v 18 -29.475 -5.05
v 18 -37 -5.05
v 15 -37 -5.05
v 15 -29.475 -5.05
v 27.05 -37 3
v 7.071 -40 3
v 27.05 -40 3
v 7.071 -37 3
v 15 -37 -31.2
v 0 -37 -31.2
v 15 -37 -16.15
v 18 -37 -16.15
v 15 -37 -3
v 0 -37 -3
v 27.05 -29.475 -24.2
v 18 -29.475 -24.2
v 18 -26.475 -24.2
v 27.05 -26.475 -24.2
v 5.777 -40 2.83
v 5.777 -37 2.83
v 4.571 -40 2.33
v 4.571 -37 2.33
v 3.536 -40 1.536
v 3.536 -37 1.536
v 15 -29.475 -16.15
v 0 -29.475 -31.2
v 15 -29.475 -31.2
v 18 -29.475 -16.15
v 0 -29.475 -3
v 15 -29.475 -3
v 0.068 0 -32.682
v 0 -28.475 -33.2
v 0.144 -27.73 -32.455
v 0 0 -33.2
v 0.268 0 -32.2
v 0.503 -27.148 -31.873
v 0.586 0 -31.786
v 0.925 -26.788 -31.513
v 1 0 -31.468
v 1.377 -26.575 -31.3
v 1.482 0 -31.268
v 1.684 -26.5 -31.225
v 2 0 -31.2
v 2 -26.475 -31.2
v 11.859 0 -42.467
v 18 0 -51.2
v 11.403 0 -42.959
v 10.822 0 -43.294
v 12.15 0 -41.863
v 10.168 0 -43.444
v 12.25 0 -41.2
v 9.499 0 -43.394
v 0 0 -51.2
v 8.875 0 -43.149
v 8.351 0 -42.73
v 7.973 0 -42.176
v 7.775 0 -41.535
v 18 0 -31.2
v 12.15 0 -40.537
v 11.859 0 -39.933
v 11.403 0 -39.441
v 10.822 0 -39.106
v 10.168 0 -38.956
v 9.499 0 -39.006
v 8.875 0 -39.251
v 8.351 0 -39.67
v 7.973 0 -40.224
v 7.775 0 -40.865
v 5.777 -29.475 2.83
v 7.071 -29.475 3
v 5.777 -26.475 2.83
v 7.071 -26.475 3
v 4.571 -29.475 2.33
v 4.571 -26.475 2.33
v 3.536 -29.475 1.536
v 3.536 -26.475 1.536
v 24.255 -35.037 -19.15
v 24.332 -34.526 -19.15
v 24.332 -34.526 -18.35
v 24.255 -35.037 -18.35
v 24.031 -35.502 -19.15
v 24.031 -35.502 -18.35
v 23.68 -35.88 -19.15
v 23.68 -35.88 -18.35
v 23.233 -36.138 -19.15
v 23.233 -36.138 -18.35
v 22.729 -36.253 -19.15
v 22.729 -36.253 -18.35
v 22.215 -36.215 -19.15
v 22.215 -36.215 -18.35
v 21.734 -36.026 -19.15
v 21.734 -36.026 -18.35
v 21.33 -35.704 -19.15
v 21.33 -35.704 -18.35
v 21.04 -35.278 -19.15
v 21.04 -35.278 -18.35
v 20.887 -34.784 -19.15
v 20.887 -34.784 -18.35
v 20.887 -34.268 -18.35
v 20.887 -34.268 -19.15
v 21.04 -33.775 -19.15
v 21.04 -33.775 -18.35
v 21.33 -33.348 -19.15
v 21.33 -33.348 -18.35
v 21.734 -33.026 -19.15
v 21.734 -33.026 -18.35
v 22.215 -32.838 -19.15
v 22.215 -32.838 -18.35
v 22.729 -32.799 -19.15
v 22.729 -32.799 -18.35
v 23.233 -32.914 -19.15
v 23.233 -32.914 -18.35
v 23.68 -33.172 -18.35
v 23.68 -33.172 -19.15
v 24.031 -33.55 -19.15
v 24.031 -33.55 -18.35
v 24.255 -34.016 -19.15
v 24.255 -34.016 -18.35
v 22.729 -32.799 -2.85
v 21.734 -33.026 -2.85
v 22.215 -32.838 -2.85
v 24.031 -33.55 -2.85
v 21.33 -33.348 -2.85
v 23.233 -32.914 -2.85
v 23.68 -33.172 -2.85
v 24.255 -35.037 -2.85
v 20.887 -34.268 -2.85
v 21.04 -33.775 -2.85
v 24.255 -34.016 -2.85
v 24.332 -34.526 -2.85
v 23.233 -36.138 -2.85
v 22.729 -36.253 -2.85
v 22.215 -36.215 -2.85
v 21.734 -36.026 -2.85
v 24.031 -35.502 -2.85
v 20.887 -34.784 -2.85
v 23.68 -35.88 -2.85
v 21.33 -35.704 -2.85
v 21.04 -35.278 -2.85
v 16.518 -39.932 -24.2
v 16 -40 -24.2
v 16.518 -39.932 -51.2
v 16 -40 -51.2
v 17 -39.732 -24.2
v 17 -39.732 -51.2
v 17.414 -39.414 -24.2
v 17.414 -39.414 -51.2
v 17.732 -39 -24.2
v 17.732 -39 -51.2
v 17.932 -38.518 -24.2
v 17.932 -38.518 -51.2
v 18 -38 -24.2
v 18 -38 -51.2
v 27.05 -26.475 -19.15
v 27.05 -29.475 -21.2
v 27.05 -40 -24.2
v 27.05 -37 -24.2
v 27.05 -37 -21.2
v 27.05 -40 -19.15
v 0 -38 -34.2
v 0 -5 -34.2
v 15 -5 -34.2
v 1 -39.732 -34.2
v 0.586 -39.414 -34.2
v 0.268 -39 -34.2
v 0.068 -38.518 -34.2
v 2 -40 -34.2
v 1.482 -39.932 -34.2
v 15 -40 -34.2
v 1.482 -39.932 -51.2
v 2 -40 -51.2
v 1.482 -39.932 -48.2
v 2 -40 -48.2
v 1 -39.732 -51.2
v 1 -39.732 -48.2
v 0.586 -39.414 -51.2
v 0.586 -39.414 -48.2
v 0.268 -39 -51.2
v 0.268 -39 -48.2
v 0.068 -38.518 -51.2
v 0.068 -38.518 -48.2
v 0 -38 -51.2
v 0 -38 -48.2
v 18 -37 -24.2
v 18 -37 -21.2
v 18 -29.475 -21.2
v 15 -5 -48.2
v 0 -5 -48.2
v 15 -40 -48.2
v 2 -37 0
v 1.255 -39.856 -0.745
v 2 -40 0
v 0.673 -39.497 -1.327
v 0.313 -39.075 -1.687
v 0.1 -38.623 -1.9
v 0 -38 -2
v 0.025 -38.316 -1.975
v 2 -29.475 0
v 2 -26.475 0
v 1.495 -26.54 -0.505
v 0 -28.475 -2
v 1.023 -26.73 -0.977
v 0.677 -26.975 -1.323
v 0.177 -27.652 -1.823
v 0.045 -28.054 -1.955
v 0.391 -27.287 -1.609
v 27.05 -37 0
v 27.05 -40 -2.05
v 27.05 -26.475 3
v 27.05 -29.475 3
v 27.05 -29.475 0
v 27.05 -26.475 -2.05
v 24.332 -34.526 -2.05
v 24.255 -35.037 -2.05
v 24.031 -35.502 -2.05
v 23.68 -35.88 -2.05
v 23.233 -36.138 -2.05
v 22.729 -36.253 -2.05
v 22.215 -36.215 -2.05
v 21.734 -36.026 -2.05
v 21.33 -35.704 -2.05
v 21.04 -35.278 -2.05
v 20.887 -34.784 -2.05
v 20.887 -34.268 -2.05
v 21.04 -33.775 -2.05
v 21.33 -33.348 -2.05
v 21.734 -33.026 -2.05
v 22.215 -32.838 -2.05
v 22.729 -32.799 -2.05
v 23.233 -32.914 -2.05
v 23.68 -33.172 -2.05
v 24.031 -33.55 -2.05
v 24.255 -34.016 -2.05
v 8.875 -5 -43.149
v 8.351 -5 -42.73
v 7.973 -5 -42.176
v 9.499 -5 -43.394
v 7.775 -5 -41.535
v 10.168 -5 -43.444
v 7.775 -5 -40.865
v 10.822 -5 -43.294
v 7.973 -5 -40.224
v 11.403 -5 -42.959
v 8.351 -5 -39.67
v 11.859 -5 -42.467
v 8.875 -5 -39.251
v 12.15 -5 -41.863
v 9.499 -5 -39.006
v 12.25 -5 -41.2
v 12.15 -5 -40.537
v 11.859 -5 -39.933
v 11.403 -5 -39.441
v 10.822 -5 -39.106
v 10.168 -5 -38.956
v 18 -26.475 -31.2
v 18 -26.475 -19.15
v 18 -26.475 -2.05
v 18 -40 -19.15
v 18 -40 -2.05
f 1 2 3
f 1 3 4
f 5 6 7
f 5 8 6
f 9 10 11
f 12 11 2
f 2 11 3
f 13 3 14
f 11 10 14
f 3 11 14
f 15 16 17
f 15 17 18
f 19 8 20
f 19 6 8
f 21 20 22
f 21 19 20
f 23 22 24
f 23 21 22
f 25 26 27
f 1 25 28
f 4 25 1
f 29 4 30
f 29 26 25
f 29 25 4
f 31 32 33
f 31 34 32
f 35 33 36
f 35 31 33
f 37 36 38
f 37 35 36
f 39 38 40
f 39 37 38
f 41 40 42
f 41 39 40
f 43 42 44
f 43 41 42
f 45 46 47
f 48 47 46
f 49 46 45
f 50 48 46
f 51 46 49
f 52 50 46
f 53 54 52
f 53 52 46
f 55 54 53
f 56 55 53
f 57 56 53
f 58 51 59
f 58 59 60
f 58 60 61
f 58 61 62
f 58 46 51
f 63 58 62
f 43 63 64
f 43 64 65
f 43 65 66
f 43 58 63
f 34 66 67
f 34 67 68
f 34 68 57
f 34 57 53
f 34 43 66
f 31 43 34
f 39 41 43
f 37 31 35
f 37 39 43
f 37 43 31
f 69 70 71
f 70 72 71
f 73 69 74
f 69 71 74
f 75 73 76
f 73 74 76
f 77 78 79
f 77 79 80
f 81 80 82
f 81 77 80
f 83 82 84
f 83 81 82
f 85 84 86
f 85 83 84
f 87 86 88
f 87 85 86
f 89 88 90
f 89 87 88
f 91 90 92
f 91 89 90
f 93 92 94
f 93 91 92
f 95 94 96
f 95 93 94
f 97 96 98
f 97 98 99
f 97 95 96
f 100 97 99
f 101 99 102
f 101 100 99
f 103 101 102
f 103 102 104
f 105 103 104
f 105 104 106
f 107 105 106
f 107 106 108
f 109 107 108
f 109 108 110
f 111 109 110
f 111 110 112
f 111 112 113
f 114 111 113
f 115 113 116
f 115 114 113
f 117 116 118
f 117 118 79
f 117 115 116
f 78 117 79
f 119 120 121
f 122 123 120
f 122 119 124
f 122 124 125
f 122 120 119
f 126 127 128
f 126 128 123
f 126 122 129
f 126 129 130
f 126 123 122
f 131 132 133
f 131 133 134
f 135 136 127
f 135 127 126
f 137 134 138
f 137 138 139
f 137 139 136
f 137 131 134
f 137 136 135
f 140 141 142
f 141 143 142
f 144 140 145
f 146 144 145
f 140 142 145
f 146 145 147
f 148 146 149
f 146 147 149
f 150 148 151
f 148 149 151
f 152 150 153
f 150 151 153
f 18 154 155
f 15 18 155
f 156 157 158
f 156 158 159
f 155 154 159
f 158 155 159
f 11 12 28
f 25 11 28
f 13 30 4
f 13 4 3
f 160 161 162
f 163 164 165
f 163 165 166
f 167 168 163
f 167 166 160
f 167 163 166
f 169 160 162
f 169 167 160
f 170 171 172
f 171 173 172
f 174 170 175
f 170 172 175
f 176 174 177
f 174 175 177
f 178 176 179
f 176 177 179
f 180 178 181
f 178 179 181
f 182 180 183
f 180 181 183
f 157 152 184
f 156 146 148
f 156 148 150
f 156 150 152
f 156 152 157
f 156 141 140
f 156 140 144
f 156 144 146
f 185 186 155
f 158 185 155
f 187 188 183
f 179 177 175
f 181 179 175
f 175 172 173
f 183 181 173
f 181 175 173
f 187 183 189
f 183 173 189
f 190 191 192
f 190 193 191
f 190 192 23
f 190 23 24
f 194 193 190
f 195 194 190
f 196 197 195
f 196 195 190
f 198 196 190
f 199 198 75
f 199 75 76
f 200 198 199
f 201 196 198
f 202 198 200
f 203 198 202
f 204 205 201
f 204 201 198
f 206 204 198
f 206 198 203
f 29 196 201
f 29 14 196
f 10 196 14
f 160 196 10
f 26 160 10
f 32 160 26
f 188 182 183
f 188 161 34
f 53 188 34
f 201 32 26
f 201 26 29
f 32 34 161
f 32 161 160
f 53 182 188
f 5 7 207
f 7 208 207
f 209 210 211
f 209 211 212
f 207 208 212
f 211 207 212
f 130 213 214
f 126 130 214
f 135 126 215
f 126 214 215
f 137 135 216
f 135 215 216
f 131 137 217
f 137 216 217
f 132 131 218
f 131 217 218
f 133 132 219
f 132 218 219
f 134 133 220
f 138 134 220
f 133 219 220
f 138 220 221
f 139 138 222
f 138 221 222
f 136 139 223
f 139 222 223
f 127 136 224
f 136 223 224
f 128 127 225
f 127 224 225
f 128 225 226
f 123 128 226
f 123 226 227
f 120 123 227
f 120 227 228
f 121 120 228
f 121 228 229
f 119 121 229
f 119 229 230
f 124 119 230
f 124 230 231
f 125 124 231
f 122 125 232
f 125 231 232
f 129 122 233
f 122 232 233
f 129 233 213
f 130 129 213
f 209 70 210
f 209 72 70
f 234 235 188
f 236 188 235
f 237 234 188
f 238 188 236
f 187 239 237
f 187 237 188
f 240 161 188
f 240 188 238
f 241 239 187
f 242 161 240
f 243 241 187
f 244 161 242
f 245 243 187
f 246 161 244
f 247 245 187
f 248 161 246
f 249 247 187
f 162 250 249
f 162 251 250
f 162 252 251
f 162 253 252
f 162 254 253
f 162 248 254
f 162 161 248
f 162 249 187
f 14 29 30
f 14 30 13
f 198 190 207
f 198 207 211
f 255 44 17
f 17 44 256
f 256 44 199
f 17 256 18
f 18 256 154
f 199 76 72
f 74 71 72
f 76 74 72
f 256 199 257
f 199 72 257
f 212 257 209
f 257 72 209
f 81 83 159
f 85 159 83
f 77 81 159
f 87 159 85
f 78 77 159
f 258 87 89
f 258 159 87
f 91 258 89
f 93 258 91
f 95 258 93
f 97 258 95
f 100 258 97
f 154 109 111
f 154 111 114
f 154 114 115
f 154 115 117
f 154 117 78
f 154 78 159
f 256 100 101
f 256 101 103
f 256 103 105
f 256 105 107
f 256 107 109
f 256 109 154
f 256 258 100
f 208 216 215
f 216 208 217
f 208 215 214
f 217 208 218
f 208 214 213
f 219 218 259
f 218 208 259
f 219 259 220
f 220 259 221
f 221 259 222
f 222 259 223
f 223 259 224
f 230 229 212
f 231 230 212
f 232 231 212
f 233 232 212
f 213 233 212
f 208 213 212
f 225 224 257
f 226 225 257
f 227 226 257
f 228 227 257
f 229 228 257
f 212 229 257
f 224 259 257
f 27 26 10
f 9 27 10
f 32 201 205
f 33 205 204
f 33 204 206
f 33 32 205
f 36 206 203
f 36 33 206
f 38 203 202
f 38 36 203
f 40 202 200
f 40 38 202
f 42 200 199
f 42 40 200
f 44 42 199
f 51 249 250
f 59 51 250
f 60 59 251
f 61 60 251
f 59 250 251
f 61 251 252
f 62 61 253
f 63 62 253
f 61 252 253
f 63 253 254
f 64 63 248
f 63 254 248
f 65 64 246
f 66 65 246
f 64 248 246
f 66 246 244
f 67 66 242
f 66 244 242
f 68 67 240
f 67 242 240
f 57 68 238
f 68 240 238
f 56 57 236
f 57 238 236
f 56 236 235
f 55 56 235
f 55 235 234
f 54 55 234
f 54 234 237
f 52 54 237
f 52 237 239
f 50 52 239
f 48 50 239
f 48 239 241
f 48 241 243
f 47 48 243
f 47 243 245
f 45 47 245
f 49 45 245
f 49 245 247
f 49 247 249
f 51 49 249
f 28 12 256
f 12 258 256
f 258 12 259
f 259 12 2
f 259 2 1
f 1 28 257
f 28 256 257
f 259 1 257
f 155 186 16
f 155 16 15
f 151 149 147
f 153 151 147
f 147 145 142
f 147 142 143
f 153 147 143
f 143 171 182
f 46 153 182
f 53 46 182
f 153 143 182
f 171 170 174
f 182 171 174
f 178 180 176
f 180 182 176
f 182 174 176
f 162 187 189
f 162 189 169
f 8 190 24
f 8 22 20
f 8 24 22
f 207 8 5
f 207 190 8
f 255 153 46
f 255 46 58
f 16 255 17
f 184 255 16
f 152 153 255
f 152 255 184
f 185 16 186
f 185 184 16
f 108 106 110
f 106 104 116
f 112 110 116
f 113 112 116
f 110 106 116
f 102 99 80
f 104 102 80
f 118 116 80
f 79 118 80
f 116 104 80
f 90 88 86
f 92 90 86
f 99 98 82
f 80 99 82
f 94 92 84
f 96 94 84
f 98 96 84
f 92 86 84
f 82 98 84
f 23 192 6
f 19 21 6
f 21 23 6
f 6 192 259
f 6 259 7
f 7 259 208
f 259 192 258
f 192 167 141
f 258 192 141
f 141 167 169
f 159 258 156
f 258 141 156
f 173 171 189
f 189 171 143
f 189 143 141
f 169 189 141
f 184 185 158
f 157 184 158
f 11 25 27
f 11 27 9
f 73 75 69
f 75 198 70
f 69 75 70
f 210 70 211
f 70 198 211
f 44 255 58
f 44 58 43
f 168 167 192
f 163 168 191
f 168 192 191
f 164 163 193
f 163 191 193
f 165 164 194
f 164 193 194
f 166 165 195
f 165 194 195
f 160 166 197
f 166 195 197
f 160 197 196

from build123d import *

# Parameters (mm, degrees)
F0_W      = 18
F0_H      = 21.2
F1_DEPTH  = 40
F2_W      = 13.525
F2_H      = 2.05
F3_DEPTH  = 9.05
F4_R      = 1.732
F5_DEPTH  = 0.8
F7_W      = 18
F7_H      = 13.525
F8_DEPTH  = 30
F9_W      = 18
F9_H      = 20
F10_DEPTH = 26.475
F11_W     = 18
F11_H     = 26.475
F12_DEPTH = 21.2
F13_W     = 15
F13_H     = 14
F14_DEPTH = 35
F16_D     = 4.5
F17_W     = 7.525
F17_H     = 28.2
F18_DEPTH = 15
F19_W     = 7.525
F19_H     = 11.1
F20_DEPTH = 18.001
F21_W     = 27.05
F21_H     = 3
F22_DEPTH = 3
F23_W     = 9.05
F23_H     = 3
F24_DEPTH = 3
F25_SIZE  = 5
F26_R     = 2
F27_R     = 5


# Not quite as in the source:
# - a pattern or mirror of a feature is missing from the dataset's text; its kind, count and spacing are read off the source's solid


with BuildPart() as f1:
    # F0 (on Front) → F1 (new body)
    with BuildSketch(Plane.XZ):
        with Locations((9, -10.6)):
            Rectangle(F0_W, F0_H)
    extrude(amount=F1_DEPTH)

    # F2 (on face) → F3 (join)
    with BuildSketch(Plane.YZ.offset(18)):
        with Locations((-33.2375, -1.025)):
            Rectangle(F2_W, F2_H)
        with Locations((-33.2375, -20.175)):
            Rectangle(F2_W, F2_H)
    extrude(amount=F3_DEPTH)

    # F4 (on face) → F5 (join)
    with BuildSketch(Plane(origin=(0, 0, -2.05), x_dir=(1, 0, 0), z_dir=(0, 0, -1))):
        with Locations((22.6, 34.5260798931)):
            Circle(F4_R)
    f5 = extrude(amount=F5_DEPTH)

    # F5_copies: F5 across plane
    add(f5.mirror(Plane(origin=(0, 0, -10.6), x_dir=(-1, 0, 0), z_dir=(0, 0, -1))))

    # F7 (on face) → F8 (join)
    with BuildSketch(Plane(origin=(0, 0, -21.2), x_dir=(1, 0, 0), z_dir=(0, 0, -1))):
        with Locations((9, 33.2375)):
            Rectangle(F7_W, F7_H)
    extrude(amount=F8_DEPTH)

    # F9 (on face) → F10 (join, through all)
    with BuildSketch(Plane(origin=(0, -26.475, 0), x_dir=(-1, 0, 0), z_dir=(0, 1, 0))):
        with Locations((-9, -41.2)):
            Rectangle(F9_W, F9_H)
    extrude(amount=F10_DEPTH)

    # F11 (on face) → F12 (cut, through all)
    with BuildSketch(Plane(origin=(0, 0, -21.2), x_dir=(1, 0, 0), z_dir=(0, 0, -1))):
        with Locations((9, 13.2375)):
            Rectangle(F11_W, F11_H)
    extrude(amount=-F12_DEPTH, mode=Mode.SUBTRACT)

    # F13 (on face) → F14 (cut)
    with BuildSketch(Plane.XZ.offset(40)):
        with Locations((7.5, -41.2)):
            Rectangle(F13_W, F13_H)
    extrude(amount=-F14_DEPTH, mode=Mode.SUBTRACT)

    # F16 (through all)
    with Locations(Plane(origin=(0, 0, 0), x_dir=(-1, 0, 0), z_dir=(0, 1, 0))):
        with Locations((-10, -41.2)):
            Hole(F16_D / 2)

    # F17 (on face) → F18 (cut)
    with BuildSketch(Plane(origin=(0, 0, 0), x_dir=(0, -1, 0), z_dir=(-1, 0, 0))):
        with Locations((33.2375, -17.1)):
            Rectangle(F17_W, F17_H)
    extrude(amount=-F18_DEPTH, mode=Mode.SUBTRACT)

    # F19 (on face) → F20 (cut, through all)
    with BuildSketch(Plane.YZ.offset(18)):
        with Locations((-33.2375, -10.6)):
            Rectangle(F19_W, F19_H)
    extrude(amount=-F20_DEPTH, mode=Mode.SUBTRACT)

    # F21 (on face) → F22 (join)
    with BuildSketch(Plane.XY):
        with Locations((13.525, -38.5)):
            Rectangle(F21_W, F21_H)
        with Locations((13.525, -27.975)):
            Rectangle(F21_W, F21_H)
    extrude(amount=F22_DEPTH)

    # F23 (on face) → F24 (join)
    with BuildSketch(Plane(origin=(0, 0, -21.2), x_dir=(1, 0, 0), z_dir=(0, 0, -1))):
        with Locations((22.525, 38.5)):
            Rectangle(F23_W, F23_H)
        with Locations((22.525, 27.975)):
            Rectangle(F23_W, F23_H)
    extrude(amount=F24_DEPTH)

    # F25
    f25_edges = [f1.edges().sort_by_distance(p)[0] for p in [
        (0, -27.975, 3),
    ]]
    chamfer(f25_edges, length=F25_SIZE)

    # F26
    f26_edges = [f1.edges().sort_by_distance(p)[0] for p in [
        (0, -40, -49.7),
        (0, -40, -18.1),
        (0, -13.2375, -31.2),
        (18, -40, -37.7),
        (0, -26.475, -16.6),
    ]]
    fillet(f26_edges, radius=F26_R)

    # F27
    f27_edges = [f1.edges().sort_by_distance(p)[0] for p in [
        (5, -38.5, 3),
        (5, -27.975, 3),
    ]]
    fillet(f27_edges, radius=F27_R)


solid = f1.part
